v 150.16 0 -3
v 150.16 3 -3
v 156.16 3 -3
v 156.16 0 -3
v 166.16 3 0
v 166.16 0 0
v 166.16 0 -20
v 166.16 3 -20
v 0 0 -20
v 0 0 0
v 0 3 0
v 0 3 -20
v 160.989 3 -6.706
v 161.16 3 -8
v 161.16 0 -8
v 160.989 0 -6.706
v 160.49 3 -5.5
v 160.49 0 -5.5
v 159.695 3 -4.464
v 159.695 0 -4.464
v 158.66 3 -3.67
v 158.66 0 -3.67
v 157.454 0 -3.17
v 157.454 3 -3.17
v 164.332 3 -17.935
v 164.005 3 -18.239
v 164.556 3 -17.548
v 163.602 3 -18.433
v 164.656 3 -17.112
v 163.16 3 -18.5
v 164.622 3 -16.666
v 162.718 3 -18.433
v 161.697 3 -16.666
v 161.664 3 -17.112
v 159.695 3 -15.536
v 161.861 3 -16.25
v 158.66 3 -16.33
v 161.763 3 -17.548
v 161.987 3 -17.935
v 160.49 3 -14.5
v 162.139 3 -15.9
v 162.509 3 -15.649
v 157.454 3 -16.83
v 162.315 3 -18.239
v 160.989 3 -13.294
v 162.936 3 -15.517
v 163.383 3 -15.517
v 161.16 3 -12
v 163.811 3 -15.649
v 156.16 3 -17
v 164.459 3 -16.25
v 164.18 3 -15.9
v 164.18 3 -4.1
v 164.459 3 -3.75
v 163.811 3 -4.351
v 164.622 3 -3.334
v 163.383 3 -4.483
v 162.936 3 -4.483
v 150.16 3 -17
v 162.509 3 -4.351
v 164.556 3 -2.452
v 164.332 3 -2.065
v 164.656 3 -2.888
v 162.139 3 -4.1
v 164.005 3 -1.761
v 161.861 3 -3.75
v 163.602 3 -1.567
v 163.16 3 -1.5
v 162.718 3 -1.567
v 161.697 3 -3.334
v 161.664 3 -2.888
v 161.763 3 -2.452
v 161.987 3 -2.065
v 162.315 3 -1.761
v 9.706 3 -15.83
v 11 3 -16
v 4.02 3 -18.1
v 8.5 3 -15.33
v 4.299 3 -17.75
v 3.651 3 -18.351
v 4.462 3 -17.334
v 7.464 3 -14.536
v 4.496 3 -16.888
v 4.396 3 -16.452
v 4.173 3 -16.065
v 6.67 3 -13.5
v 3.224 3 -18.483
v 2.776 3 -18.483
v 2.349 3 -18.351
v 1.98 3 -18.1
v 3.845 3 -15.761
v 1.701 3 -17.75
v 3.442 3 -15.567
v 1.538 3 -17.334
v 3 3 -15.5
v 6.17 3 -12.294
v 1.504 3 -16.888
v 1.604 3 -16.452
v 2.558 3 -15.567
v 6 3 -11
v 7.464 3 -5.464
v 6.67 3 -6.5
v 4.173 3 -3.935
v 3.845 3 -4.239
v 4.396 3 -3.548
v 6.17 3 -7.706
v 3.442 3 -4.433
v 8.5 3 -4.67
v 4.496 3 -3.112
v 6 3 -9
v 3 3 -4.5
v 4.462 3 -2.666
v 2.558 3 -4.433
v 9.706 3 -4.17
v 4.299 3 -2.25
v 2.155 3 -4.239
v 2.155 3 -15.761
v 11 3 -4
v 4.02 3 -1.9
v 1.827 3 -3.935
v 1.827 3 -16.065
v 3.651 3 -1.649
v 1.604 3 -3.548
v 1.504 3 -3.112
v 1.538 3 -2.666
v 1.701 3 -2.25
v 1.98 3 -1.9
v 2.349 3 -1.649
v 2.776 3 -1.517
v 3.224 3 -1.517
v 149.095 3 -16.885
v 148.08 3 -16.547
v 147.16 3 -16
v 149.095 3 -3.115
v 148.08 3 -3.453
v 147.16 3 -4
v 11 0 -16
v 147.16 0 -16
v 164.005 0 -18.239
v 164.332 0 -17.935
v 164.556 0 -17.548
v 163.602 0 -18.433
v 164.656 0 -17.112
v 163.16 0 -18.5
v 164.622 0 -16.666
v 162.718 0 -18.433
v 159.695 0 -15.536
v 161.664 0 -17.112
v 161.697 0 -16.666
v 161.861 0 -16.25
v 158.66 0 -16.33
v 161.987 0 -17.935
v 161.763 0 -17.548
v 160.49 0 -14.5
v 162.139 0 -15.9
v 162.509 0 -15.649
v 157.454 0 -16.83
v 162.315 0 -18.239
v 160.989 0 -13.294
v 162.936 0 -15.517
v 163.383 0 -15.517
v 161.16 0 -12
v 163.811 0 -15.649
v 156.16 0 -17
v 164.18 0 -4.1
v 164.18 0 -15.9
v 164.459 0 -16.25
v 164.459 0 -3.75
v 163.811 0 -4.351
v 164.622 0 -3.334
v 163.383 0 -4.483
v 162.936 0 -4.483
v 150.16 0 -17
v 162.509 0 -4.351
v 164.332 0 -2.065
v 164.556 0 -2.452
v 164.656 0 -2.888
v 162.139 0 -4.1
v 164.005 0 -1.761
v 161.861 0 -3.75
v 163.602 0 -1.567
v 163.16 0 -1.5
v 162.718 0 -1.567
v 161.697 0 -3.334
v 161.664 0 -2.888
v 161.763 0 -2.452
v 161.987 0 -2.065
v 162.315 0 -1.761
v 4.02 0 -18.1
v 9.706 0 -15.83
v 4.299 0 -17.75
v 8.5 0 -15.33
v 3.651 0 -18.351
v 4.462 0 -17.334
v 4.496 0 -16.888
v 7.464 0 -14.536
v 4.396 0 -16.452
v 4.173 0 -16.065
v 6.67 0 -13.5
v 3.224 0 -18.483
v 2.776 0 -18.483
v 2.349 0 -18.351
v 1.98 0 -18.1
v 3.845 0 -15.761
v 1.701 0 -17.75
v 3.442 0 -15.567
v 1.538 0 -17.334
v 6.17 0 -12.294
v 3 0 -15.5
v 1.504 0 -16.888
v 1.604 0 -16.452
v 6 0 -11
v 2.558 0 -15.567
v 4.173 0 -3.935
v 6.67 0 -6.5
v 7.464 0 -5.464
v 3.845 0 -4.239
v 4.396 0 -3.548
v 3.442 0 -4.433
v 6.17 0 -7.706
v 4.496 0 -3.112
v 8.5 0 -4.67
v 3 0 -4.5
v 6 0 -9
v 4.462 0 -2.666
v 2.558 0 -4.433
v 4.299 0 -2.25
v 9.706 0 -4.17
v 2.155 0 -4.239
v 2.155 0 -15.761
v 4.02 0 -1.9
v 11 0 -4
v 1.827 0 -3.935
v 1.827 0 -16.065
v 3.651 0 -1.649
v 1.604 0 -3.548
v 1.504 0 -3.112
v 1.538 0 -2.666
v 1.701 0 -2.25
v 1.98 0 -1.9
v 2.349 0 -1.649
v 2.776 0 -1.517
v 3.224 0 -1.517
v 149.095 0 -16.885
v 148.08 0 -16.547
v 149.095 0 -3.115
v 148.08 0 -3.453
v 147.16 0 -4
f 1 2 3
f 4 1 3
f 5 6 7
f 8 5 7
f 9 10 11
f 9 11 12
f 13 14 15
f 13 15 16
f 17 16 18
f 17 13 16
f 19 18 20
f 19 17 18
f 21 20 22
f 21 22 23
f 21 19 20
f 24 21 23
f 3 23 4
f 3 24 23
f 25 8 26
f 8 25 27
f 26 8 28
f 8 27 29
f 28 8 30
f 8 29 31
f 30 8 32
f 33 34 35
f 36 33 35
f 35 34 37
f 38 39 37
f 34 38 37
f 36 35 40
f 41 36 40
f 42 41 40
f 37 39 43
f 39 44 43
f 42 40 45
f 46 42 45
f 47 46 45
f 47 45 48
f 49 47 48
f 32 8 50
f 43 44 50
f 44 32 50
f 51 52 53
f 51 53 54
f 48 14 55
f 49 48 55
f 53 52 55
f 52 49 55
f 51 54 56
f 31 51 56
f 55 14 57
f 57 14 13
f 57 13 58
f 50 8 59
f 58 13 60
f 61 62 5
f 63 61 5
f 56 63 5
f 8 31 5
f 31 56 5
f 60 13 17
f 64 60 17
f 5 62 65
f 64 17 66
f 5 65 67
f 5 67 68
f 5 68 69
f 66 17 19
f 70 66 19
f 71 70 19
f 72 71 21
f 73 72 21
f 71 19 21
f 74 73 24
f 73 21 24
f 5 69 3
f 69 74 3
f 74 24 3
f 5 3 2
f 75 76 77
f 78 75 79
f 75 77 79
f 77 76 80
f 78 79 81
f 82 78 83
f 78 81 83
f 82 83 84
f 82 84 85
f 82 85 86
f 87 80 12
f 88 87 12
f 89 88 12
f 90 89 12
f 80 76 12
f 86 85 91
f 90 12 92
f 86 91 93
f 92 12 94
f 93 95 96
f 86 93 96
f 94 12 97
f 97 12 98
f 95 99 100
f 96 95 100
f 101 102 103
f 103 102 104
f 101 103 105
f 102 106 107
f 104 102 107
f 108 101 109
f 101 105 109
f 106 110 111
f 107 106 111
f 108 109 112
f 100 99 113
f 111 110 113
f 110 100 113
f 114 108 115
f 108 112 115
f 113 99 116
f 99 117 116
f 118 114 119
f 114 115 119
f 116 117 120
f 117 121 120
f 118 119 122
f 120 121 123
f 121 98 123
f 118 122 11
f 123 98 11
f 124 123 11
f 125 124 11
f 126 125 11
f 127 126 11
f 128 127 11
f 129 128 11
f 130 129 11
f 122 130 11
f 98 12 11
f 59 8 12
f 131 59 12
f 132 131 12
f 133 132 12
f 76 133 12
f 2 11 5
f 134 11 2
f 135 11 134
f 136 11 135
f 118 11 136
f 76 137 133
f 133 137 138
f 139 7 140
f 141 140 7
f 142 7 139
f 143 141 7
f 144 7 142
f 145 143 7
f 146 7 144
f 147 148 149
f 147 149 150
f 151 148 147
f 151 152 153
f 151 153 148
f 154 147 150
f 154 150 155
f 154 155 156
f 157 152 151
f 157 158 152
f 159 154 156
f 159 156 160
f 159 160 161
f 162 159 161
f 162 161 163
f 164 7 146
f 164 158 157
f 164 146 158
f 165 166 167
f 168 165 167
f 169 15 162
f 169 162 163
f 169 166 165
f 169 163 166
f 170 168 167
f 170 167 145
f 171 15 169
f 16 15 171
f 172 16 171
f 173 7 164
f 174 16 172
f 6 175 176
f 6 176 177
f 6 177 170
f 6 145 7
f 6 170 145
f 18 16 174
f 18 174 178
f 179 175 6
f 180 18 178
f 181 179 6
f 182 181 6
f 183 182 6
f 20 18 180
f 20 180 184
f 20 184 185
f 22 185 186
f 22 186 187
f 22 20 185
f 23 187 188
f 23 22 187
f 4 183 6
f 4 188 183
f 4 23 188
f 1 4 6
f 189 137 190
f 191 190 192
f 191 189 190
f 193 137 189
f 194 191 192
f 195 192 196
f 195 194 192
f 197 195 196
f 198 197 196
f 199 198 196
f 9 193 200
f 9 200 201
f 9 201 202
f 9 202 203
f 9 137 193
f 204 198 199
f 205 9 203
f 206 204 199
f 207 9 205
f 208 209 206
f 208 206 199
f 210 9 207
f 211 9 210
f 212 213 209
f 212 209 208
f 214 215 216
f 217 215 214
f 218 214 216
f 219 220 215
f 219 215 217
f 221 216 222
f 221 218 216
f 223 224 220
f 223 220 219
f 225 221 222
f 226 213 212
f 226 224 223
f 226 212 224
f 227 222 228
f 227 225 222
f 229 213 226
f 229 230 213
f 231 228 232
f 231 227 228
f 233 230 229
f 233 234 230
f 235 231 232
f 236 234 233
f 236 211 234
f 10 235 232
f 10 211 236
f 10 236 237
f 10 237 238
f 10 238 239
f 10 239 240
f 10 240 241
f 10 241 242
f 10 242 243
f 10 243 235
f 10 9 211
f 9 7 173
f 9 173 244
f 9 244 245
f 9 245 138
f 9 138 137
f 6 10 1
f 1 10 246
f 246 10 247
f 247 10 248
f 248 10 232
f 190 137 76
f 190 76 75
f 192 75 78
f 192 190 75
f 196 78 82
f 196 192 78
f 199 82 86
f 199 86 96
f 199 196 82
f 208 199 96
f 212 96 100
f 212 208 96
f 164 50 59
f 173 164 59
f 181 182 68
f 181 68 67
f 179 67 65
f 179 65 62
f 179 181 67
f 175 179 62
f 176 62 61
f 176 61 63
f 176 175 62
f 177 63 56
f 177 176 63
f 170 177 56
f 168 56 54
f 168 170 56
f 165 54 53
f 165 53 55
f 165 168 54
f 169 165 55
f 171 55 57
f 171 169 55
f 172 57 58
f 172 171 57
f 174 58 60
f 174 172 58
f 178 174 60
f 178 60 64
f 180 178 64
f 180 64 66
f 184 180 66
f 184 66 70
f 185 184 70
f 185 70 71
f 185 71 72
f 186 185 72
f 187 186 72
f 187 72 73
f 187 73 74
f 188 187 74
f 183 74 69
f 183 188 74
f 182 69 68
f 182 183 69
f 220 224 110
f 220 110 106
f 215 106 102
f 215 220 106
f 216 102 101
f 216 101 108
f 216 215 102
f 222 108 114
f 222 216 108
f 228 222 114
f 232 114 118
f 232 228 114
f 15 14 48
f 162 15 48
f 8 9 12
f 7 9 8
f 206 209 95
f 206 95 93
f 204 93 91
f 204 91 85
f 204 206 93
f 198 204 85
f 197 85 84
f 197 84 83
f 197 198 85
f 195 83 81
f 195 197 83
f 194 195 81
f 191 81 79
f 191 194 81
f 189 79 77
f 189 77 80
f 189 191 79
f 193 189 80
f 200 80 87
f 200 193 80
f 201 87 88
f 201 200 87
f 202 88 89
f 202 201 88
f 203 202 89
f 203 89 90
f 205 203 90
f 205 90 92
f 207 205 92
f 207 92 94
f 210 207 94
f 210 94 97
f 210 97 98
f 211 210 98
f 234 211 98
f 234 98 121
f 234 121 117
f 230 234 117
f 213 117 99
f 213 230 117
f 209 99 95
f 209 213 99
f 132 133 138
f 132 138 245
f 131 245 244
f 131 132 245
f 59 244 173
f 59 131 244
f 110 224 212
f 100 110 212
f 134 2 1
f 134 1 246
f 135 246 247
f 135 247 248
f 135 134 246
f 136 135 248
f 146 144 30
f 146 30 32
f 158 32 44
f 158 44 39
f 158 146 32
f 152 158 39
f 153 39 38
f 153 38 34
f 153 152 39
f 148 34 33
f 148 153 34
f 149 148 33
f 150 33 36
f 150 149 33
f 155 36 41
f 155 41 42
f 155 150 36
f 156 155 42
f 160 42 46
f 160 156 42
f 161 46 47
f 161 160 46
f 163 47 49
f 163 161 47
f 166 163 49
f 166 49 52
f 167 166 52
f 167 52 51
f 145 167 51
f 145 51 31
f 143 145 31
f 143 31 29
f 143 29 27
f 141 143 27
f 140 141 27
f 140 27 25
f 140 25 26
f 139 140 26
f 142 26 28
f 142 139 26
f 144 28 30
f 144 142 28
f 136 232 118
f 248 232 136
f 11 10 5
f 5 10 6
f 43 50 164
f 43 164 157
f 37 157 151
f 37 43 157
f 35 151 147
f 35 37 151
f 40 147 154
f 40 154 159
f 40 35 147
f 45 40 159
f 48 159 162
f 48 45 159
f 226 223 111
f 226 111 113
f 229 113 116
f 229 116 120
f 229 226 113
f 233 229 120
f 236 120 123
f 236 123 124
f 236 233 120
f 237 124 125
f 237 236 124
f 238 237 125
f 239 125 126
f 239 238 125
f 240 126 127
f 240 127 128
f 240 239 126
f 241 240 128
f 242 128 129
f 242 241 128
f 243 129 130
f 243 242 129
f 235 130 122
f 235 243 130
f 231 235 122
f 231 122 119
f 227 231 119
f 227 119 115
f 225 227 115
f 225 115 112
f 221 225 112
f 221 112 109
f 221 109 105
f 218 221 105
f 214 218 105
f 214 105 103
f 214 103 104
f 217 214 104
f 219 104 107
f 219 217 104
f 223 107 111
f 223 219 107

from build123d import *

# Parameters (mm, degrees)
SKETCH1_W           = 166.159725664
SKETCH1_H           = 20
SKETCH1_R           = 1.5
SKETCH1_W_2         = 154.159725664
SKETCH1_H_2         = 12
BOSS_EXTRUDE1_DEPTH = 3
CUT_EXTRUDE1_DEPTH  = 168.38594455
FILLET1_R           = 5


with BuildPart() as part:
    # Sketch1 → Boss-Extrude1 (new body)
    with BuildSketch(Plane(origin=(0, 0, 0), x_dir=(1, 0, 0), z_dir=(0, 1, 0))):
        with Locations((83.079862832, 10)):
            Rectangle(SKETCH1_W, SKETCH1_H)
        with Locations(Location((3, 17, 0), (0, 0, 270))):
            Circle(SKETCH1_R, mode=Mode.SUBTRACT)
        with Locations(Location((3, 3, 0), (0, 0, 90))):
            Circle(SKETCH1_R, mode=Mode.SUBTRACT)
        with Locations(Location((163.159725664, 3, 0), (0, 0, 270))):
            Circle(SKETCH1_R, mode=Mode.SUBTRACT)
        with Locations(Location((163.159725664, 17, 0), (0, 0, 90))):
            Circle(SKETCH1_R, mode=Mode.SUBTRACT)
        with Locations((83.079862832, 10)):
            Rectangle(SKETCH1_W_2, SKETCH1_H_2, mode=Mode.SUBTRACT)
    extrude(amount=BOSS_EXTRUDE1_DEPTH)

    # Sketch2 → Cut-Extrude1 (cut, through all)
    with BuildSketch(Plane(origin=(0, 3, 0), x_dir=(1, 0, 0), z_dir=(0, 1, 0))):
        Polygon((147.159725664, 17), (147.159725664, 16), (160.159725664, 16), (160.159725664, 4), (147.159725664, 4), (147.159725664, 3), (161.159725664, 3), (161.159725664, 17), align=None)
    extrude(amount=-CUT_EXTRUDE1_DEPTH, mode=Mode.SUBTRACT)

    # Fillet1
    # the kernel refuses this fillet: 5 mm, written as the material it adds along each edge
    with BuildSketch(Plane(origin=(161.159725664, 3, -17), x_dir=(0, 0, 1), z_dir=(0, -1, 0)), Plane(origin=(161.159725664, 3, -3), x_dir=(-1, 0, 0), z_dir=(0, -1, 0)), Plane(origin=(6, 0, -16), x_dir=(0, 0, 1), z_dir=(0, 1, 0))) as fillet1_piece_1:
        with BuildLine():
            CenterArc((FILLET1_R, FILLET1_R), FILLET1_R, 180, 90)
            Line((0, FILLET1_R), (-FILLET1_R * 0.02, FILLET1_R))
            Line((-FILLET1_R * 0.02, FILLET1_R), (-FILLET1_R * 0.02, -FILLET1_R * 0.02))
            Line((-FILLET1_R * 0.02, -FILLET1_R * 0.02), (FILLET1_R, -FILLET1_R * 0.02))
            Line((FILLET1_R, -FILLET1_R * 0.02), (FILLET1_R, 0))
        make_face()
    extrude(amount=3)
    with BuildSketch(Plane(origin=(147.159725664, 3, -17), x_dir=(1, 0, 0), z_dir=(0, -1, 0))) as fillet1_piece_2:
        with BuildLine():
            CenterArc((3, 5), FILLET1_R, 233.130102354, 36.869897646)
            Line((0, 1), (-0.06, 0.92))
            ThreePointArc((-0.06, 0.92), (-0.1, 0.5), (-0.1, 0))
            Line((-0.1, 0), (0, -0.1))
            Line((0, -0.1), (3, -0.1))
            Line((3, -0.1), (3, 0))
        make_face()
    extrude(amount=3)
    with BuildSketch(Plane(origin=(147.159725664, 3, -3), x_dir=(0, 0, -1), z_dir=(0, -1, 0))) as fillet1_piece_3:
        with BuildLine():
            CenterArc((5, 3), FILLET1_R, 180, 36.869897646)
            Line((0, 3), (-0.1, 3))
            Line((-0.1, 3), (-0.1, 0))
            Line((-0.1, 0), (0, -0.1))
            ThreePointArc((0, -0.1), (0.5, -0.1), (0.92, -0.06))
            Line((0.92, -0.06), (1, 0))
        make_face()
    extrude(amount=3)
    with BuildSketch(Plane(origin=(6, 0, -4), x_dir=(0, 0, -1), z_dir=(0, 1, 0))) as fillet1_piece_4:
        with BuildLine():
            CenterArc((FILLET1_R, -FILLET1_R), FILLET1_R, 90, 90)
            Line((0, -FILLET1_R), (-FILLET1_R * 0.02, -FILLET1_R))
            Line((-FILLET1_R * 0.02, -FILLET1_R), (-FILLET1_R * 0.02, FILLET1_R * 0.02))
            Line((-FILLET1_R * 0.02, FILLET1_R * 0.02), (FILLET1_R, FILLET1_R * 0.02))
            Line((FILLET1_R, FILLET1_R * 0.02), (FILLET1_R, 0))
        make_face()
    extrude(amount=3)


solid = part.part
